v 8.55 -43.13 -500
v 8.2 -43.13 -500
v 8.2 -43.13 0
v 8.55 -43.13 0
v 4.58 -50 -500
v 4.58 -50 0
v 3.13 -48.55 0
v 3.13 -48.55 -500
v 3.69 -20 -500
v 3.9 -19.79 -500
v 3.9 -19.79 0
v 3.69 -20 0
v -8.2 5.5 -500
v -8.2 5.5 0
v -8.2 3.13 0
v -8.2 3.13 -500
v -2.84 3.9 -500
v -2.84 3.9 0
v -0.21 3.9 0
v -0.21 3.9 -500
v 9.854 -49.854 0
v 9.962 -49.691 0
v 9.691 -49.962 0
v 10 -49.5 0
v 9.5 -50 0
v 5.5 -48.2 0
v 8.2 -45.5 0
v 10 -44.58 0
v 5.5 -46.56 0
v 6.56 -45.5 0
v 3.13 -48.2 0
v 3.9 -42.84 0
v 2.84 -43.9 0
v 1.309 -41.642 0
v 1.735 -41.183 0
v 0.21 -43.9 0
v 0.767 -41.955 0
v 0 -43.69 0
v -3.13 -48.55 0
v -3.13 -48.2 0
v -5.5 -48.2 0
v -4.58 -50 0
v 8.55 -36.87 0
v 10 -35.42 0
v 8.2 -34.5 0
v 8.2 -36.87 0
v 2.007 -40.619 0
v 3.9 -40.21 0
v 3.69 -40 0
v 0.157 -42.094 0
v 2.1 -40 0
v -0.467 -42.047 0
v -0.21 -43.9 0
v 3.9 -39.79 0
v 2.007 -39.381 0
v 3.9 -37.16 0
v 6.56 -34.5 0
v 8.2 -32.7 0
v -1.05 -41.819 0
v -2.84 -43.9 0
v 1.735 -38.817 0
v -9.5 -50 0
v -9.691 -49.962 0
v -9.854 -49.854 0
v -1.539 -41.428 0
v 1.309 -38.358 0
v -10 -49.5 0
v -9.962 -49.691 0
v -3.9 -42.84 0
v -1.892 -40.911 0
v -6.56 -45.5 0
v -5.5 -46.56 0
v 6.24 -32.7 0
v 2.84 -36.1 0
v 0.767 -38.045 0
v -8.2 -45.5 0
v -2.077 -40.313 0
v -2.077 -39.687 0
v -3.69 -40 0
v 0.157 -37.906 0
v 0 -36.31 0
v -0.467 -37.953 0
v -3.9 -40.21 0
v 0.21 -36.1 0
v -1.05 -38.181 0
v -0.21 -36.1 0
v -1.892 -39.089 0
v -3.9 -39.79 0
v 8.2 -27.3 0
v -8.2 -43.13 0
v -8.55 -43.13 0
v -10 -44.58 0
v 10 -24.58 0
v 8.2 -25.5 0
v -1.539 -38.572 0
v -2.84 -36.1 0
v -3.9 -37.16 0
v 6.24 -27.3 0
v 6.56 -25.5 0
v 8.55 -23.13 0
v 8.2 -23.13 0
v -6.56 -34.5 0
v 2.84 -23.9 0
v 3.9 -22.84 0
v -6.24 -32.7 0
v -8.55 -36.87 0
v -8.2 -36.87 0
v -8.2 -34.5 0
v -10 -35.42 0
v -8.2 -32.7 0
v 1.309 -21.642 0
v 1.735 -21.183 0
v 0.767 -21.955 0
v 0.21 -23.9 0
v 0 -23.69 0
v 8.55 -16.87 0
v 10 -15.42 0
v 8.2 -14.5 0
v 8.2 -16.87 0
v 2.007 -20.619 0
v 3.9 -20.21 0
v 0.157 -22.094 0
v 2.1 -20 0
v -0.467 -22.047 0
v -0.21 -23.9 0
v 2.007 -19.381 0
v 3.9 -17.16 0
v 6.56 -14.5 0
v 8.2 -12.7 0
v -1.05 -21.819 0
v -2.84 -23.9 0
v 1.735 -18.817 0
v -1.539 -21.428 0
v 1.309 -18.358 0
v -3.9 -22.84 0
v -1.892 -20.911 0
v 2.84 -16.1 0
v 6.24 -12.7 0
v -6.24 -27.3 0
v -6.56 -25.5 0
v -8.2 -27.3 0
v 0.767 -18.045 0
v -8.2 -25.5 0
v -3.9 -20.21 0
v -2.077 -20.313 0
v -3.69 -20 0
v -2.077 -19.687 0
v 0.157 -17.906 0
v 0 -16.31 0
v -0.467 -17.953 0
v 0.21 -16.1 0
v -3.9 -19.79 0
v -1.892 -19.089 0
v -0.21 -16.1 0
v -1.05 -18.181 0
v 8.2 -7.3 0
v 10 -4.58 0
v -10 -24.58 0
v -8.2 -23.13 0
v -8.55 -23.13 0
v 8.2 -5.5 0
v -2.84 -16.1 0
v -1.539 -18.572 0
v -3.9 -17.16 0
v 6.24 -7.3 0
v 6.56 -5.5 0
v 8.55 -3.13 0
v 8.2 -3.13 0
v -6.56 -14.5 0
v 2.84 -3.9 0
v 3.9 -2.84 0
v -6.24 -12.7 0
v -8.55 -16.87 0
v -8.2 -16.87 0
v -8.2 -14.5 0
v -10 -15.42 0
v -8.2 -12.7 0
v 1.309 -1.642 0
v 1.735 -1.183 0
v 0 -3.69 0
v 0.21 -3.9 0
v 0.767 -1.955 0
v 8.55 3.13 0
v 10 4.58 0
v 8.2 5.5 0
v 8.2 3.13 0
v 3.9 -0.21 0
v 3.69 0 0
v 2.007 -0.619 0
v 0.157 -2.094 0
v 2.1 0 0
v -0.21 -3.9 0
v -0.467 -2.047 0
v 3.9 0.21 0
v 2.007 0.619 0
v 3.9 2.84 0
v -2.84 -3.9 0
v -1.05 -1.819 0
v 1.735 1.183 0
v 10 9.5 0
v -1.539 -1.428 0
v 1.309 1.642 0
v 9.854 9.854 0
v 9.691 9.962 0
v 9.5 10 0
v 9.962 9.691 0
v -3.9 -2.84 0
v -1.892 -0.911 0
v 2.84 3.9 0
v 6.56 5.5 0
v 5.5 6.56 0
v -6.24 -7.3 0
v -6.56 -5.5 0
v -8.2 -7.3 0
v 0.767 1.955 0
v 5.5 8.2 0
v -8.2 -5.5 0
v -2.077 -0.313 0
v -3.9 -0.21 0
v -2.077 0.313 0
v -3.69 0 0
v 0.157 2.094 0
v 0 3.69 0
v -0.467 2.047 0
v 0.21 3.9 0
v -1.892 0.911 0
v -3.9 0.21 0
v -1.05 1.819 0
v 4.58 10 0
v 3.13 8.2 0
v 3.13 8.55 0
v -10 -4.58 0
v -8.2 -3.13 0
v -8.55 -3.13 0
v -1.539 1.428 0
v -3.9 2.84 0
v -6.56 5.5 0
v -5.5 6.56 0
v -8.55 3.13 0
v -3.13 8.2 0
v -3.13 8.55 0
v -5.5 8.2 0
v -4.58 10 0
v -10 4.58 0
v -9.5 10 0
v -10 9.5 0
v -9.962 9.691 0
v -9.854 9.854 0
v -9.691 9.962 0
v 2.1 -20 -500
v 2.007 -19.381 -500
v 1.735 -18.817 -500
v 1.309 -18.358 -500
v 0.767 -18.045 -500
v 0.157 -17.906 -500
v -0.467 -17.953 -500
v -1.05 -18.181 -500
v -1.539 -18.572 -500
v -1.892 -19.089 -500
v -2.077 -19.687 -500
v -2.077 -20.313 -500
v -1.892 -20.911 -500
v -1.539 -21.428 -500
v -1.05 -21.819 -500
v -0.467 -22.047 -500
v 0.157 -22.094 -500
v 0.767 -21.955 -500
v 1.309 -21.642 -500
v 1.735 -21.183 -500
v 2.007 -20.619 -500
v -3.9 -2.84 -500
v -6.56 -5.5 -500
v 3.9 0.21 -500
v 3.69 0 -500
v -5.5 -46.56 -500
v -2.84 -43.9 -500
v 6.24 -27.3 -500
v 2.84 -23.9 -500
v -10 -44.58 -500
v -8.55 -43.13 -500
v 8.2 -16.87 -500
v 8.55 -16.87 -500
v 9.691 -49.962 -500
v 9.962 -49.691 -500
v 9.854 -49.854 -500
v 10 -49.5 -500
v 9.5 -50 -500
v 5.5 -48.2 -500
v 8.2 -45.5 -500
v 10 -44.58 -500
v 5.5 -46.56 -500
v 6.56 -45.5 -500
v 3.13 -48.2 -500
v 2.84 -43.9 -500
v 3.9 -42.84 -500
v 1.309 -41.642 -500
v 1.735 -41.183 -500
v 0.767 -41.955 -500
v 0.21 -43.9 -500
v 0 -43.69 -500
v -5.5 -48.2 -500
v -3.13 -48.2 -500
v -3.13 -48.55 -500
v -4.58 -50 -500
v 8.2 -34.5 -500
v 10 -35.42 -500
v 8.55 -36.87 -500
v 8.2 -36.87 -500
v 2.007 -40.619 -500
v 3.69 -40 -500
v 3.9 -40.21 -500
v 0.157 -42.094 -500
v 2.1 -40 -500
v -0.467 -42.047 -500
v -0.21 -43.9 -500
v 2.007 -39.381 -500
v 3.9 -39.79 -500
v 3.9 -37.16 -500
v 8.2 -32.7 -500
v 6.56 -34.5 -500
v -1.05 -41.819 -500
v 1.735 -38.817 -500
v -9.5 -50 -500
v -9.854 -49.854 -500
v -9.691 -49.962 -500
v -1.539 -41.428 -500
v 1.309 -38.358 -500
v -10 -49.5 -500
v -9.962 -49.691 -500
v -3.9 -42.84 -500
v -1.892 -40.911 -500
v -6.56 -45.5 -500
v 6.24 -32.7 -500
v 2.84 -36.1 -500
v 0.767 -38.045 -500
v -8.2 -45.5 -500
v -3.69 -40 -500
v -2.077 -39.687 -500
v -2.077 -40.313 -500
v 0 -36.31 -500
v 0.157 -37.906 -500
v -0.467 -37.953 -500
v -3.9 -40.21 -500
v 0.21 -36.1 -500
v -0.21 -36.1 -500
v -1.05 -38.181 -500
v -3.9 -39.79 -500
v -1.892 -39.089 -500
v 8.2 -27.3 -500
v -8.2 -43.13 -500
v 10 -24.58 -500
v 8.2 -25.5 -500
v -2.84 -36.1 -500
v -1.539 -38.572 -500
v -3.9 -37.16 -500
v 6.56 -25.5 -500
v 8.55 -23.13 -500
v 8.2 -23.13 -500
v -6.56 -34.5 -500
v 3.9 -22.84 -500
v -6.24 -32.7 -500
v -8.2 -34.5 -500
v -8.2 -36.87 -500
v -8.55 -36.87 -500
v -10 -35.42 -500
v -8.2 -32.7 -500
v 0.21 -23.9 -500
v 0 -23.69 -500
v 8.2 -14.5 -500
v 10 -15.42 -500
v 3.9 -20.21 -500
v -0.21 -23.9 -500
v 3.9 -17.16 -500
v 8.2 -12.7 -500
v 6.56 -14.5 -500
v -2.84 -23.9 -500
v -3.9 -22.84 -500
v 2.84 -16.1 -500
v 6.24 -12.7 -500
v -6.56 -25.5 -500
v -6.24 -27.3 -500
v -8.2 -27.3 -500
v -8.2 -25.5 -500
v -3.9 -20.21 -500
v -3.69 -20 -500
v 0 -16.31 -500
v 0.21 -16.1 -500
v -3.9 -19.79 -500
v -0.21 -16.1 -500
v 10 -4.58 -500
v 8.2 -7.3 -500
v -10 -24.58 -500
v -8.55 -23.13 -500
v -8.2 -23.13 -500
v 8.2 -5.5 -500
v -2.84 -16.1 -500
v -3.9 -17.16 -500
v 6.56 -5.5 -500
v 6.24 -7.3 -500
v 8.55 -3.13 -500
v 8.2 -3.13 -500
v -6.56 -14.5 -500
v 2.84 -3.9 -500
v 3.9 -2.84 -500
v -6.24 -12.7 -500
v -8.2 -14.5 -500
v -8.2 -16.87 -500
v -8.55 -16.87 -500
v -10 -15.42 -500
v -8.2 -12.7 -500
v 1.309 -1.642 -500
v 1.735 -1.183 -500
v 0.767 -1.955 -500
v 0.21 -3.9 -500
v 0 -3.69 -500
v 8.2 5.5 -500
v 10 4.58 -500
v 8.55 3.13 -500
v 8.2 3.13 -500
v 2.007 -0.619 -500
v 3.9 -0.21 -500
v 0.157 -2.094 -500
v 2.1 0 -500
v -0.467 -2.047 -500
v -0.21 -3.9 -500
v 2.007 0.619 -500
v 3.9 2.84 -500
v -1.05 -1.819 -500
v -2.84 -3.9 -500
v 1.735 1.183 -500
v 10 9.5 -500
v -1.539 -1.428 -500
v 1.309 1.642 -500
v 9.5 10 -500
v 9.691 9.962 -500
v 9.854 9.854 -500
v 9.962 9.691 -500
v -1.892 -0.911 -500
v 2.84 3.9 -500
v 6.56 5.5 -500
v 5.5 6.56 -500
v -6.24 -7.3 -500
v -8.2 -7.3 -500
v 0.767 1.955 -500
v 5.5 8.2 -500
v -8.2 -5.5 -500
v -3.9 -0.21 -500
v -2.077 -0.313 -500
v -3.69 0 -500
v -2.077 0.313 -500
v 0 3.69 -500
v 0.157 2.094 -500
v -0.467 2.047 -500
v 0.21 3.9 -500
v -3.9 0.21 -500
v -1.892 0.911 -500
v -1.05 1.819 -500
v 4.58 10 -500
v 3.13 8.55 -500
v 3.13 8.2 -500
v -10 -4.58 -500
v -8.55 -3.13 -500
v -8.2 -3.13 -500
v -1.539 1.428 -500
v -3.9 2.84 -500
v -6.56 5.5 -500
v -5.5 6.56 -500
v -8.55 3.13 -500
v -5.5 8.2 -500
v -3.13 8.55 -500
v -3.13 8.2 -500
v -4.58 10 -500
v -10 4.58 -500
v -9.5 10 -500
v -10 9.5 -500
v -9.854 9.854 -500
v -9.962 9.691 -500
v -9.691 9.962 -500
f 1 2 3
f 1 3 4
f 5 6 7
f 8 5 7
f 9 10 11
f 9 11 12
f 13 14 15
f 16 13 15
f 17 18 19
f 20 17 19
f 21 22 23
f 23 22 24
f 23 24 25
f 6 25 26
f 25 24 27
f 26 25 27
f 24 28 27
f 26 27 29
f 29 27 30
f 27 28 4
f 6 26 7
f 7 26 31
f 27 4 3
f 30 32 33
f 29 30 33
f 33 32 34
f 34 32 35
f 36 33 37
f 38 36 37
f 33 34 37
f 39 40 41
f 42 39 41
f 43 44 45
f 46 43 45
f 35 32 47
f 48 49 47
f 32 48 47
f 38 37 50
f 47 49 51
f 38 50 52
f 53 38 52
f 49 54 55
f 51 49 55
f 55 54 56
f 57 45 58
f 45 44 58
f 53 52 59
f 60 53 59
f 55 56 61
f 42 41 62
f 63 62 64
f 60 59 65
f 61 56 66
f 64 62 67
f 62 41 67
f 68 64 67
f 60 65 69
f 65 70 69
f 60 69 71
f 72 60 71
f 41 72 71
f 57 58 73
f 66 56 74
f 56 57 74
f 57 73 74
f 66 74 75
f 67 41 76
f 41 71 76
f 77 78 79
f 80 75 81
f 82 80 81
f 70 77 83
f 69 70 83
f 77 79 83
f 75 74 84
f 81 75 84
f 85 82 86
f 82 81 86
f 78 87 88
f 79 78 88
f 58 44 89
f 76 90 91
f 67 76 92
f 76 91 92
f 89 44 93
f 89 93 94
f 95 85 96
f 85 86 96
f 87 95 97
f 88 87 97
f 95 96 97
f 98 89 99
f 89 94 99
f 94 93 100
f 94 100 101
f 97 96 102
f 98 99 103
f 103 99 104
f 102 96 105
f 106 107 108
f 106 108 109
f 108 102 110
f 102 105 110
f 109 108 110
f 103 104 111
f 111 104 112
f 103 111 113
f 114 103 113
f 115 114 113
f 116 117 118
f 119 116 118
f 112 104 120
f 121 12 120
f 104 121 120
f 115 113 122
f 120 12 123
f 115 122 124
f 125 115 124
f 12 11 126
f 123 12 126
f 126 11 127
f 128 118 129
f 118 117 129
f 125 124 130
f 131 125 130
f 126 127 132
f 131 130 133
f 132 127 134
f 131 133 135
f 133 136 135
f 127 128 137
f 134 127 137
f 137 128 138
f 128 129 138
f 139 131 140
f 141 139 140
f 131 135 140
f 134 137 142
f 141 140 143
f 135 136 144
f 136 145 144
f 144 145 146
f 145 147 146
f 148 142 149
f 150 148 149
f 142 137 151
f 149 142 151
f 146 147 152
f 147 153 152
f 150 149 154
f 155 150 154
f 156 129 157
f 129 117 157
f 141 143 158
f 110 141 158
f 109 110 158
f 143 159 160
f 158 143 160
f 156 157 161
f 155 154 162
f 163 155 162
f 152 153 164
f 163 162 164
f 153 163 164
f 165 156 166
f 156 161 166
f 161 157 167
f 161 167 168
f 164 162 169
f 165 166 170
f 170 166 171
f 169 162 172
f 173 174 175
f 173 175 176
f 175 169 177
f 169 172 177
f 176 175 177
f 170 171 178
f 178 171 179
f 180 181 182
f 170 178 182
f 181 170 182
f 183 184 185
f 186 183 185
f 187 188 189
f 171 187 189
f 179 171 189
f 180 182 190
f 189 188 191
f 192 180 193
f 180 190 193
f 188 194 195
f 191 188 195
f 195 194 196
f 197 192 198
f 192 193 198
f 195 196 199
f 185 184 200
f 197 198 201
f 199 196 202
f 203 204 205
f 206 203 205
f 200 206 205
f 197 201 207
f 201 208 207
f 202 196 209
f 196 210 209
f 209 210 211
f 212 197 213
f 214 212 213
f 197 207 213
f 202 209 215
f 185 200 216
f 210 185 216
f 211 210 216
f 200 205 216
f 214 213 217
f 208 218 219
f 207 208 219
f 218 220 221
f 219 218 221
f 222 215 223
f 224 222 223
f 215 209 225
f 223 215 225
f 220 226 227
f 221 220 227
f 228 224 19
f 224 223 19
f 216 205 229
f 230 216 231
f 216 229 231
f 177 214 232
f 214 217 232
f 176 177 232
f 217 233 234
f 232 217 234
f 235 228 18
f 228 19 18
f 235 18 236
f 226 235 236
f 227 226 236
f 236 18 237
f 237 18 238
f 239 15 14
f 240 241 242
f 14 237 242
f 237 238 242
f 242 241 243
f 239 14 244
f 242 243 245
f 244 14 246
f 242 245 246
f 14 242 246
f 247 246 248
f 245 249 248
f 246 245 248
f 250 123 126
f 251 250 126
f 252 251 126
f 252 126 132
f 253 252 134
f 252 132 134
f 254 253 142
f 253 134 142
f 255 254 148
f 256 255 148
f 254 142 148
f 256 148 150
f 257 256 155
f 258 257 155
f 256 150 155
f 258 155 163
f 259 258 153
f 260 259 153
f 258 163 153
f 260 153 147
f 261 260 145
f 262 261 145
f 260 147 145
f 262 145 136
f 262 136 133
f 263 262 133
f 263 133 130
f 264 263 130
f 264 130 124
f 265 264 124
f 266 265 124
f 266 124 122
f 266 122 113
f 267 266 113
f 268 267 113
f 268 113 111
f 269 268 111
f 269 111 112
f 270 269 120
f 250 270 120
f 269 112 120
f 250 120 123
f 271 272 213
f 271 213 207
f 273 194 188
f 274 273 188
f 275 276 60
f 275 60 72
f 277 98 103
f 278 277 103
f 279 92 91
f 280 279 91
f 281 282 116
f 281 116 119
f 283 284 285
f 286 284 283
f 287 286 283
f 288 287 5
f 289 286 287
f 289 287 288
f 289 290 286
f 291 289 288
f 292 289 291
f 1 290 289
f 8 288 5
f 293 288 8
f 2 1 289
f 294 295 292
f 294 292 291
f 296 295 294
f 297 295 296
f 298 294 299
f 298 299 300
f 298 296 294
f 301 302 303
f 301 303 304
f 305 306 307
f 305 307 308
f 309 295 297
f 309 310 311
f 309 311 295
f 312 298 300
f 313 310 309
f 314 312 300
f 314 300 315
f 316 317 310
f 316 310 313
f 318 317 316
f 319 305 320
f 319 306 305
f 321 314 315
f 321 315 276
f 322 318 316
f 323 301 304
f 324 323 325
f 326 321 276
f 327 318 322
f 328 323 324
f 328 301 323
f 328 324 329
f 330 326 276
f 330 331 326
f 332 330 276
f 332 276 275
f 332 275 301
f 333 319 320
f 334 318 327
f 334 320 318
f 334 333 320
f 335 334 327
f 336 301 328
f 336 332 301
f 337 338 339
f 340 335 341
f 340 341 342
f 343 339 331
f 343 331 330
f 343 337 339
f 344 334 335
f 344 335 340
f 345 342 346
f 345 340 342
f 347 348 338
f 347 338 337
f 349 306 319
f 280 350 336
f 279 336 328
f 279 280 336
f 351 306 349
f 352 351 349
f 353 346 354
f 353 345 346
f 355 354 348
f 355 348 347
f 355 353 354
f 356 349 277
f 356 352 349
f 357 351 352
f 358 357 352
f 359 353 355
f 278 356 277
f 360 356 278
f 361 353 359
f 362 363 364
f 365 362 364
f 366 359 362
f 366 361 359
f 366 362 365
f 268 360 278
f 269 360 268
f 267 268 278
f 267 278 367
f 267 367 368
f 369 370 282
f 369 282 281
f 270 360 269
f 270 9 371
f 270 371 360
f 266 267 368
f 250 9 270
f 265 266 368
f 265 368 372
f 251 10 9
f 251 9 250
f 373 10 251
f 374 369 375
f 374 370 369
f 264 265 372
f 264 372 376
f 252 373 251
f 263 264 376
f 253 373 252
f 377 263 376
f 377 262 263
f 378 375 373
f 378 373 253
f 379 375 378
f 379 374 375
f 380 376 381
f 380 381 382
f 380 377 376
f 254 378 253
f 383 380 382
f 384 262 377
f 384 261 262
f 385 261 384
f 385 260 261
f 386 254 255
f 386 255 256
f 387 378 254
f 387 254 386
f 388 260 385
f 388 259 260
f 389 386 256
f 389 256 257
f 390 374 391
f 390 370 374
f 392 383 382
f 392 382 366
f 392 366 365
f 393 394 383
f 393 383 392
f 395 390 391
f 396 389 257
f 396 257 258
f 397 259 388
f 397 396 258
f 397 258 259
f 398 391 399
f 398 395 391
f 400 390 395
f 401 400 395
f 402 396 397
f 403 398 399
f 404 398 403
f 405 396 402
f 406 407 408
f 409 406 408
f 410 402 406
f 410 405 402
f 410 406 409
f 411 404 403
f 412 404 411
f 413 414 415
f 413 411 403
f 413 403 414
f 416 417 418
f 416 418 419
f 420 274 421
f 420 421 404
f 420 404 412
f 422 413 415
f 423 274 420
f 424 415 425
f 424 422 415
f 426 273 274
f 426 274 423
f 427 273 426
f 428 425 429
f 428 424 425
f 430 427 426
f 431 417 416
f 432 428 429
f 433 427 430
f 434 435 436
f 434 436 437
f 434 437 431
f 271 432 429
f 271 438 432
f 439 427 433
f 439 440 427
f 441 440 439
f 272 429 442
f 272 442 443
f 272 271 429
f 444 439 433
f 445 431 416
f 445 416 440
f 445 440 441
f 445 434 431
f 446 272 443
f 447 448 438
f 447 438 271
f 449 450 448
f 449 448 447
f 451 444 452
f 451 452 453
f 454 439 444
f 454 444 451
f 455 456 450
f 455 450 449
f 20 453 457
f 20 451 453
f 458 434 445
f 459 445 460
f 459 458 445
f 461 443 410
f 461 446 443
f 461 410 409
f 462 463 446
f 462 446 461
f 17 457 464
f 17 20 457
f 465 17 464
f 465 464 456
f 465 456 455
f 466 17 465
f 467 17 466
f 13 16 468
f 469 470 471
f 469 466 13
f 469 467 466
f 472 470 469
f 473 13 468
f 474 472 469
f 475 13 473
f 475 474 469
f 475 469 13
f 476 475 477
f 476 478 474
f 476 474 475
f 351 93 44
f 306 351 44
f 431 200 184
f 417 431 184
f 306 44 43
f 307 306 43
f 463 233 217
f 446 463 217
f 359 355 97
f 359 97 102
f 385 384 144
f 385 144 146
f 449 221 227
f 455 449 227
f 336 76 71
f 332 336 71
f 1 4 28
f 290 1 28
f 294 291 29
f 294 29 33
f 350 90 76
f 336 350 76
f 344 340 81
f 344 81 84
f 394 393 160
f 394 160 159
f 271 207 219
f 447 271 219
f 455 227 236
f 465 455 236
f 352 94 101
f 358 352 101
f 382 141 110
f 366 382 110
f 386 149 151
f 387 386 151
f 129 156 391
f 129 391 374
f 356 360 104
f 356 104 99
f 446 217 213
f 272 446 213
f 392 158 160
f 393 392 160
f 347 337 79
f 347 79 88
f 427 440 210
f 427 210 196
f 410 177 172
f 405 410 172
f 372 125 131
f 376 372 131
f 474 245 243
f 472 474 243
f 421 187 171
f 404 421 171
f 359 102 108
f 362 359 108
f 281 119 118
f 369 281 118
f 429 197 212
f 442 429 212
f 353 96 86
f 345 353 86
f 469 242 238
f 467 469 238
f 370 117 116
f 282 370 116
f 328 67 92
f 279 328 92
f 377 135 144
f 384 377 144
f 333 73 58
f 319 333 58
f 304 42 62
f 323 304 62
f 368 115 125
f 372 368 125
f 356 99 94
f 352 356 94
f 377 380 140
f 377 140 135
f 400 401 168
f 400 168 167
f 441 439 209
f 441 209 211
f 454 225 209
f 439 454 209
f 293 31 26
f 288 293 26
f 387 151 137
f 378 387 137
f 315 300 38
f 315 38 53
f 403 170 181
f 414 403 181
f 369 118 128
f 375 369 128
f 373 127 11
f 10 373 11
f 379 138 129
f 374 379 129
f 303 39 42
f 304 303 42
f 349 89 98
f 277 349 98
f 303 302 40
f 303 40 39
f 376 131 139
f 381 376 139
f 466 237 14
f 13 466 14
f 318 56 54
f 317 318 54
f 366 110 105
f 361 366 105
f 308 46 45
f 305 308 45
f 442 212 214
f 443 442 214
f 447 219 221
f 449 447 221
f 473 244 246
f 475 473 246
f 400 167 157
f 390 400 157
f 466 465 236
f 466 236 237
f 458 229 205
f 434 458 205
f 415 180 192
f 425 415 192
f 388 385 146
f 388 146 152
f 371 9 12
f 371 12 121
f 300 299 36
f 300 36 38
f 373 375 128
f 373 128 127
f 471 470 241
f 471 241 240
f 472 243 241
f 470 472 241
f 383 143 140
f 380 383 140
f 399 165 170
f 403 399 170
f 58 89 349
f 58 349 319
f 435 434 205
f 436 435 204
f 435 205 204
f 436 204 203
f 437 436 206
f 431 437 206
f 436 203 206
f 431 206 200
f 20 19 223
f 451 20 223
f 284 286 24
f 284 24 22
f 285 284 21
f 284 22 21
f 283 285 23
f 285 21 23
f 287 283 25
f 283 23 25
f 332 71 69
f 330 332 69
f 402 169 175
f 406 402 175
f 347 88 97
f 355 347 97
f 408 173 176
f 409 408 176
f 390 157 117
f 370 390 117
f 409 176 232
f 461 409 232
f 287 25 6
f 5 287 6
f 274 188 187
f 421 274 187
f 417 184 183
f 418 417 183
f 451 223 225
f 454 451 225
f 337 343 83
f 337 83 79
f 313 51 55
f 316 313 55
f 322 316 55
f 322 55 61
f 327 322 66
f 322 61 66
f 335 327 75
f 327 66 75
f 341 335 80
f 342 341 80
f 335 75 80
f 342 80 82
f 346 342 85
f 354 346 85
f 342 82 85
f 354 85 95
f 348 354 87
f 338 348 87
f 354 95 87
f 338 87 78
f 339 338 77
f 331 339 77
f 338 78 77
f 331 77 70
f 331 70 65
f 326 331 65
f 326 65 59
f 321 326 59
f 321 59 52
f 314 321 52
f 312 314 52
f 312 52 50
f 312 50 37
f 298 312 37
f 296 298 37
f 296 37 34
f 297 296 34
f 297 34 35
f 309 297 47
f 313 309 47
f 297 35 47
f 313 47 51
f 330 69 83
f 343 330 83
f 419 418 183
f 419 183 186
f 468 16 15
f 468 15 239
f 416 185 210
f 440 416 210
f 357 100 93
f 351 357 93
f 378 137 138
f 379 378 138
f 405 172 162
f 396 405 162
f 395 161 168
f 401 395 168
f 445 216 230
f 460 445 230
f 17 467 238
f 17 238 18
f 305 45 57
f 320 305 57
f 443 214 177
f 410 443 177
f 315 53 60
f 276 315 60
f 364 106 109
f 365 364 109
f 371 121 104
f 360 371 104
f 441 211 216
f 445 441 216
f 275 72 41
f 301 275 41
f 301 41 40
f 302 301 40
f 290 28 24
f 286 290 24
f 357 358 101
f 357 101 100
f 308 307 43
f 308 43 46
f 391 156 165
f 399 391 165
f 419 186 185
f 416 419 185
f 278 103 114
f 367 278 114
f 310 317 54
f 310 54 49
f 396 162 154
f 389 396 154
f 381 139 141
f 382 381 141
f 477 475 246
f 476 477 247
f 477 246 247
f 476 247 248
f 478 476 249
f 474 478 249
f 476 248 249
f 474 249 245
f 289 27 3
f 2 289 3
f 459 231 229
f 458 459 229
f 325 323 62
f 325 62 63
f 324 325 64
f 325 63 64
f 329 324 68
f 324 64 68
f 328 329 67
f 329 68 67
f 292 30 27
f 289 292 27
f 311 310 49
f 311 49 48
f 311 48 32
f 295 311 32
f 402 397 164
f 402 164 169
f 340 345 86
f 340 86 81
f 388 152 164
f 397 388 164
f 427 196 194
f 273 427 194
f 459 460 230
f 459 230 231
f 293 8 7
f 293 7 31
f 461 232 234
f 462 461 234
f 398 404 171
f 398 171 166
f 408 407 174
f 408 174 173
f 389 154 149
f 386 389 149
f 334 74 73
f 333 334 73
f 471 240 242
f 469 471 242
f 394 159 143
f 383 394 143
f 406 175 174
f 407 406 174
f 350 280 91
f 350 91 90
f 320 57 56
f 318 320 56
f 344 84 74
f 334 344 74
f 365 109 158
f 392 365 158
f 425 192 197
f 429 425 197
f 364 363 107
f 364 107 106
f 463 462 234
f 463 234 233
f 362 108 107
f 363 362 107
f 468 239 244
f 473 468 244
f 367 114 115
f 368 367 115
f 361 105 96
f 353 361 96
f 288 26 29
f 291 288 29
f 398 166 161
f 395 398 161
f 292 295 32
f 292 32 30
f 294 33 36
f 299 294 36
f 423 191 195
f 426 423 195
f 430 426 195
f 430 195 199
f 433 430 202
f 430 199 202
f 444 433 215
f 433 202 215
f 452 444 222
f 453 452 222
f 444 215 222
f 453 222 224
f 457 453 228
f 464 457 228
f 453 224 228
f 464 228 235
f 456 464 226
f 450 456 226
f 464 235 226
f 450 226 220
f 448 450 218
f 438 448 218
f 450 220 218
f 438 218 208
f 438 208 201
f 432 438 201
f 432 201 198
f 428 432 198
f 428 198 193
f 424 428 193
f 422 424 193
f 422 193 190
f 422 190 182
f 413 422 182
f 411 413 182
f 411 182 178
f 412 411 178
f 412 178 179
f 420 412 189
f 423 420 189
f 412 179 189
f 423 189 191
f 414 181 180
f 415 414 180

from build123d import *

# Parameters (mm, degrees)
SKETCH2_R           = 2.1
BOSS_EXTRUDE2_DEPTH = 500


with BuildPart() as part:
    # Sketch2 → Boss-Extrude2 (new body)
    with BuildSketch(Plane.XY):
        with BuildLine():
            Line((-9.5, 10), (-4.58, 10))
            Line((-4.58, 10), (-3.13, 8.55))
            Line((-3.13, 8.55), (-3.13, 8.2))
            Line((-3.13, 8.2), (-5.5, 8.2))
            Line((-5.5, 8.2), (-5.5, 6.56))
            Line((-5.5, 6.56), (-2.84, 3.9))
            Line((-2.84, 3.9), (-0.21, 3.9))
            Line((-0.21, 3.9), (0, 3.69))
            Line((0, 3.69), (0.21, 3.9))
            Line((0.21, 3.9), (2.84, 3.9))
            Line((2.84, 3.9), (5.5, 6.56))
            Line((5.5, 6.56), (5.5, 8.2))
            Line((5.5, 8.2), (3.13, 8.2))
            Line((3.13, 8.2), (3.13, 8.55))
            Line((3.13, 8.55), (4.58, 10))
            Line((4.58, 10), (9.5, 10))
            ThreePointArc((9.5, 10), (9.853553391, 9.853553391), (10, 9.5))
            Line((10, 9.5), (10, 4.58))
            Line((10, 4.58), (8.55, 3.13))
            Line((8.55, 3.13), (8.2, 3.13))
            Line((8.2, 3.13), (8.2, 5.5))
            Line((8.2, 5.5), (6.56, 5.5))
            Line((6.56, 5.5), (3.9, 2.84))
            Line((3.9, 2.84), (3.9, 0.21))
            Line((3.9, 0.21), (3.69, 0))
            Line((3.69, 0), (3.9, -0.21))
            Line((3.9, -0.21), (3.9, -2.84))
            Line((3.9, -2.84), (6.56, -5.5))
            Line((6.56, -5.5), (8.2, -5.5))
            Line((8.2, -5.5), (8.2, -3.13))
            Line((8.2, -3.13), (8.55, -3.13))
            Line((8.55, -3.13), (10, -4.58))
            Line((10, -4.58), (10, -10))
            Line((10, -10), (10, -15.42))
            Line((10, -15.42), (8.55, -16.87))
            Line((8.55, -16.87), (8.2, -16.87))
            Line((8.2, -16.87), (8.2, -14.5))
            Line((8.2, -14.5), (6.56, -14.5))
            Line((6.56, -14.5), (3.9, -17.16))
            Line((3.9, -17.16), (3.9, -19.79))
            Line((3.9, -19.79), (3.69, -20))
            Line((3.69, -20), (3.9, -20.21))
            Line((3.9, -20.21), (3.9, -22.84))
            Line((3.9, -22.84), (6.56, -25.5))
            Line((6.56, -25.5), (8.2, -25.5))
            Line((8.2, -25.5), (8.2, -23.13))
            Line((8.2, -23.13), (8.55, -23.13))
            Line((8.55, -23.13), (10, -24.58))
            Line((10, -24.58), (10, -30))
            Line((10, -30), (10, -35.42))
            Line((10, -35.42), (8.55, -36.87))
            Line((8.55, -36.87), (8.2, -36.87))
            Line((8.2, -36.87), (8.2, -34.5))
            Line((8.2, -34.5), (6.56, -34.5))
            Line((6.56, -34.5), (3.9, -37.16))
            Line((3.9, -37.16), (3.9, -39.79))
            Line((3.9, -39.79), (3.69, -40))
            Line((3.69, -40), (3.9, -40.21))
            Line((3.9, -40.21), (3.9, -42.84))
            Line((3.9, -42.84), (6.56, -45.5))
            Line((6.56, -45.5), (8.2, -45.5))
            Line((8.2, -45.5), (8.2, -43.13))
            Line((8.2, -43.13), (8.55, -43.13))
            Line((8.55, -43.13), (10, -44.58))
            Line((10, -44.58), (10, -49.5))
            ThreePointArc((10, -49.5), (9.853553391, -49.853553391), (9.5, -50))
            Line((9.5, -50), (4.58, -50))
            Line((4.58, -50), (3.13, -48.55))
            Line((3.13, -48.55), (3.13, -48.2))
            Line((3.13, -48.2), (5.5, -48.2))
            Line((5.5, -48.2), (5.5, -46.56))
            Line((5.5, -46.56), (2.84, -43.9))
            Line((2.84, -43.9), (0.21, -43.9))
            Line((0.21, -43.9), (0, -43.69))
            Line((0, -43.69), (-0.21, -43.9))
            Line((-0.21, -43.9), (-2.84, -43.9))
            Line((-2.84, -43.9), (-5.5, -46.56))
            Line((-5.5, -46.56), (-5.5, -48.2))
            Line((-5.5, -48.2), (-3.13, -48.2))
            Line((-3.13, -48.2), (-3.13, -48.55))
            Line((-3.13, -48.55), (-4.58, -50))
            Line((-4.58, -50), (-9.5, -50))
            ThreePointArc((-9.5, -50), (-9.853553391, -49.853553391), (-10, -49.5))
            Line((-10, -49.5), (-10, -44.58))
            Line((-10, -44.58), (-8.55, -43.13))
            Line((-8.55, -43.13), (-8.2, -43.13))
            Line((-8.2, -43.13), (-8.2, -45.5))
            Line((-8.2, -45.5), (-6.56, -45.5))
            Line((-6.56, -45.5), (-3.9, -42.84))
            Line((-3.9, -42.84), (-3.9, -40.21))
            Line((-3.9, -40.21), (-3.69, -40))
            Line((-3.69, -40), (-3.9, -39.79))
            Line((-3.9, -39.79), (-3.9, -37.16))
            Line((-3.9, -37.16), (-6.56, -34.5))
            Line((-6.56, -34.5), (-8.2, -34.5))
            Line((-8.2, -34.5), (-8.2, -36.87))
            Line((-8.2, -36.87), (-8.55, -36.87))
            Line((-8.55, -36.87), (-10, -35.42))
            Line((-10, -35.42), (-10, -30))
            Line((-10, -30), (-10, -24.58))
            Line((-10, -24.58), (-8.55, -23.13))
            Line((-8.55, -23.13), (-8.2, -23.13))
            Line((-8.2, -23.13), (-8.2, -25.5))
            Line((-8.2, -25.5), (-6.56, -25.5))
            Line((-6.56, -25.5), (-3.9, -22.84))
            Line((-3.9, -22.84), (-3.9, -20.21))
            Line((-3.9, -20.21), (-3.69, -20))
            Line((-3.69, -20), (-3.9, -19.79))
            Line((-3.9, -19.79), (-3.9, -17.16))
            Line((-3.9, -17.16), (-6.56, -14.5))
            Line((-6.56, -14.5), (-8.2, -14.5))
            Line((-8.2, -14.5), (-8.2, -16.87))
            Line((-8.2, -16.87), (-8.55, -16.87))
            Line((-8.55, -16.87), (-10, -15.42))
            Line((-10, -15.42), (-10, -10))
            Line((-10, -10), (-10, -4.58))
            Line((-10, -4.58), (-8.55, -3.13))
            Line((-8.55, -3.13), (-8.2, -3.13))
            Line((-8.2, -3.13), (-8.2, -5.5))
            Line((-8.2, -5.5), (-6.56, -5.5))
            Line((-6.56, -5.5), (-3.9, -2.84))
            Line((-3.9, -2.84), (-3.9, -0.21))
            Line((-3.9, -0.21), (-3.69, 0))
            Line((-3.69, 0), (-3.9, 0.21))
            Line((-3.9, 0.21), (-3.9, 2.84))
            Line((-3.9, 2.84), (-6.56, 5.5))
            Line((-6.56, 5.5), (-8.2, 5.5))
            Line((-8.2, 5.5), (-8.2, 3.13))
            Line((-8.2, 3.13), (-8.55, 3.13))
            Line((-8.55, 3.13), (-10, 4.58))
            Line((-10, 4.58), (-10, 9.5))
            ThreePointArc((-10, 9.5), (-9.853553391, 9.853553391), (-9.5, 10))
        make_face()
        with Locations((0, -20)):
            Circle(SKETCH2_R, mode=Mode.SUBTRACT)
        Circle(SKETCH2_R, mode=Mode.SUBTRACT)
        with Locations((0, -40)):
            Circle(SKETCH2_R, mode=Mode.SUBTRACT)
        Polygon((0.21, -3.9), (0, -3.69), (-0.21, -3.9), (-2.84, -3.9), (-6.24, -7.3), (-8.2, -7.3), (-8.2, -12.7), (-6.24, -12.7), (-2.84, -16.1), (-0.21, -16.1), (0, -16.31), (0.21, -16.1), (2.84, -16.1), (6.24, -12.7), (8.2, -12.7), (8.2, -10), (8.2, -7.3), (6.24, -7.3), (2.84, -3.9), align=None, mode=Mode.SUBTRACT)
        Polygon((-0.21, -36.1), (0, -36.31), (0.21, -36.1), (2.84, -36.1), (6.24, -32.7), (8.2, -32.7), (8.2, -30), (8.2, -27.3), (6.24, -27.3), (2.84, -23.9), (0.21, -23.9), (0, -23.69), (-0.21, -23.9), (-2.84, -23.9), (-6.24, -27.3), (-8.2, -27.3), (-8.2, -32.7), (-6.24, -32.7), (-2.84, -36.1), align=None, mode=Mode.SUBTRACT)
    extrude(amount=-BOSS_EXTRUDE2_DEPTH)


solid = part.part
